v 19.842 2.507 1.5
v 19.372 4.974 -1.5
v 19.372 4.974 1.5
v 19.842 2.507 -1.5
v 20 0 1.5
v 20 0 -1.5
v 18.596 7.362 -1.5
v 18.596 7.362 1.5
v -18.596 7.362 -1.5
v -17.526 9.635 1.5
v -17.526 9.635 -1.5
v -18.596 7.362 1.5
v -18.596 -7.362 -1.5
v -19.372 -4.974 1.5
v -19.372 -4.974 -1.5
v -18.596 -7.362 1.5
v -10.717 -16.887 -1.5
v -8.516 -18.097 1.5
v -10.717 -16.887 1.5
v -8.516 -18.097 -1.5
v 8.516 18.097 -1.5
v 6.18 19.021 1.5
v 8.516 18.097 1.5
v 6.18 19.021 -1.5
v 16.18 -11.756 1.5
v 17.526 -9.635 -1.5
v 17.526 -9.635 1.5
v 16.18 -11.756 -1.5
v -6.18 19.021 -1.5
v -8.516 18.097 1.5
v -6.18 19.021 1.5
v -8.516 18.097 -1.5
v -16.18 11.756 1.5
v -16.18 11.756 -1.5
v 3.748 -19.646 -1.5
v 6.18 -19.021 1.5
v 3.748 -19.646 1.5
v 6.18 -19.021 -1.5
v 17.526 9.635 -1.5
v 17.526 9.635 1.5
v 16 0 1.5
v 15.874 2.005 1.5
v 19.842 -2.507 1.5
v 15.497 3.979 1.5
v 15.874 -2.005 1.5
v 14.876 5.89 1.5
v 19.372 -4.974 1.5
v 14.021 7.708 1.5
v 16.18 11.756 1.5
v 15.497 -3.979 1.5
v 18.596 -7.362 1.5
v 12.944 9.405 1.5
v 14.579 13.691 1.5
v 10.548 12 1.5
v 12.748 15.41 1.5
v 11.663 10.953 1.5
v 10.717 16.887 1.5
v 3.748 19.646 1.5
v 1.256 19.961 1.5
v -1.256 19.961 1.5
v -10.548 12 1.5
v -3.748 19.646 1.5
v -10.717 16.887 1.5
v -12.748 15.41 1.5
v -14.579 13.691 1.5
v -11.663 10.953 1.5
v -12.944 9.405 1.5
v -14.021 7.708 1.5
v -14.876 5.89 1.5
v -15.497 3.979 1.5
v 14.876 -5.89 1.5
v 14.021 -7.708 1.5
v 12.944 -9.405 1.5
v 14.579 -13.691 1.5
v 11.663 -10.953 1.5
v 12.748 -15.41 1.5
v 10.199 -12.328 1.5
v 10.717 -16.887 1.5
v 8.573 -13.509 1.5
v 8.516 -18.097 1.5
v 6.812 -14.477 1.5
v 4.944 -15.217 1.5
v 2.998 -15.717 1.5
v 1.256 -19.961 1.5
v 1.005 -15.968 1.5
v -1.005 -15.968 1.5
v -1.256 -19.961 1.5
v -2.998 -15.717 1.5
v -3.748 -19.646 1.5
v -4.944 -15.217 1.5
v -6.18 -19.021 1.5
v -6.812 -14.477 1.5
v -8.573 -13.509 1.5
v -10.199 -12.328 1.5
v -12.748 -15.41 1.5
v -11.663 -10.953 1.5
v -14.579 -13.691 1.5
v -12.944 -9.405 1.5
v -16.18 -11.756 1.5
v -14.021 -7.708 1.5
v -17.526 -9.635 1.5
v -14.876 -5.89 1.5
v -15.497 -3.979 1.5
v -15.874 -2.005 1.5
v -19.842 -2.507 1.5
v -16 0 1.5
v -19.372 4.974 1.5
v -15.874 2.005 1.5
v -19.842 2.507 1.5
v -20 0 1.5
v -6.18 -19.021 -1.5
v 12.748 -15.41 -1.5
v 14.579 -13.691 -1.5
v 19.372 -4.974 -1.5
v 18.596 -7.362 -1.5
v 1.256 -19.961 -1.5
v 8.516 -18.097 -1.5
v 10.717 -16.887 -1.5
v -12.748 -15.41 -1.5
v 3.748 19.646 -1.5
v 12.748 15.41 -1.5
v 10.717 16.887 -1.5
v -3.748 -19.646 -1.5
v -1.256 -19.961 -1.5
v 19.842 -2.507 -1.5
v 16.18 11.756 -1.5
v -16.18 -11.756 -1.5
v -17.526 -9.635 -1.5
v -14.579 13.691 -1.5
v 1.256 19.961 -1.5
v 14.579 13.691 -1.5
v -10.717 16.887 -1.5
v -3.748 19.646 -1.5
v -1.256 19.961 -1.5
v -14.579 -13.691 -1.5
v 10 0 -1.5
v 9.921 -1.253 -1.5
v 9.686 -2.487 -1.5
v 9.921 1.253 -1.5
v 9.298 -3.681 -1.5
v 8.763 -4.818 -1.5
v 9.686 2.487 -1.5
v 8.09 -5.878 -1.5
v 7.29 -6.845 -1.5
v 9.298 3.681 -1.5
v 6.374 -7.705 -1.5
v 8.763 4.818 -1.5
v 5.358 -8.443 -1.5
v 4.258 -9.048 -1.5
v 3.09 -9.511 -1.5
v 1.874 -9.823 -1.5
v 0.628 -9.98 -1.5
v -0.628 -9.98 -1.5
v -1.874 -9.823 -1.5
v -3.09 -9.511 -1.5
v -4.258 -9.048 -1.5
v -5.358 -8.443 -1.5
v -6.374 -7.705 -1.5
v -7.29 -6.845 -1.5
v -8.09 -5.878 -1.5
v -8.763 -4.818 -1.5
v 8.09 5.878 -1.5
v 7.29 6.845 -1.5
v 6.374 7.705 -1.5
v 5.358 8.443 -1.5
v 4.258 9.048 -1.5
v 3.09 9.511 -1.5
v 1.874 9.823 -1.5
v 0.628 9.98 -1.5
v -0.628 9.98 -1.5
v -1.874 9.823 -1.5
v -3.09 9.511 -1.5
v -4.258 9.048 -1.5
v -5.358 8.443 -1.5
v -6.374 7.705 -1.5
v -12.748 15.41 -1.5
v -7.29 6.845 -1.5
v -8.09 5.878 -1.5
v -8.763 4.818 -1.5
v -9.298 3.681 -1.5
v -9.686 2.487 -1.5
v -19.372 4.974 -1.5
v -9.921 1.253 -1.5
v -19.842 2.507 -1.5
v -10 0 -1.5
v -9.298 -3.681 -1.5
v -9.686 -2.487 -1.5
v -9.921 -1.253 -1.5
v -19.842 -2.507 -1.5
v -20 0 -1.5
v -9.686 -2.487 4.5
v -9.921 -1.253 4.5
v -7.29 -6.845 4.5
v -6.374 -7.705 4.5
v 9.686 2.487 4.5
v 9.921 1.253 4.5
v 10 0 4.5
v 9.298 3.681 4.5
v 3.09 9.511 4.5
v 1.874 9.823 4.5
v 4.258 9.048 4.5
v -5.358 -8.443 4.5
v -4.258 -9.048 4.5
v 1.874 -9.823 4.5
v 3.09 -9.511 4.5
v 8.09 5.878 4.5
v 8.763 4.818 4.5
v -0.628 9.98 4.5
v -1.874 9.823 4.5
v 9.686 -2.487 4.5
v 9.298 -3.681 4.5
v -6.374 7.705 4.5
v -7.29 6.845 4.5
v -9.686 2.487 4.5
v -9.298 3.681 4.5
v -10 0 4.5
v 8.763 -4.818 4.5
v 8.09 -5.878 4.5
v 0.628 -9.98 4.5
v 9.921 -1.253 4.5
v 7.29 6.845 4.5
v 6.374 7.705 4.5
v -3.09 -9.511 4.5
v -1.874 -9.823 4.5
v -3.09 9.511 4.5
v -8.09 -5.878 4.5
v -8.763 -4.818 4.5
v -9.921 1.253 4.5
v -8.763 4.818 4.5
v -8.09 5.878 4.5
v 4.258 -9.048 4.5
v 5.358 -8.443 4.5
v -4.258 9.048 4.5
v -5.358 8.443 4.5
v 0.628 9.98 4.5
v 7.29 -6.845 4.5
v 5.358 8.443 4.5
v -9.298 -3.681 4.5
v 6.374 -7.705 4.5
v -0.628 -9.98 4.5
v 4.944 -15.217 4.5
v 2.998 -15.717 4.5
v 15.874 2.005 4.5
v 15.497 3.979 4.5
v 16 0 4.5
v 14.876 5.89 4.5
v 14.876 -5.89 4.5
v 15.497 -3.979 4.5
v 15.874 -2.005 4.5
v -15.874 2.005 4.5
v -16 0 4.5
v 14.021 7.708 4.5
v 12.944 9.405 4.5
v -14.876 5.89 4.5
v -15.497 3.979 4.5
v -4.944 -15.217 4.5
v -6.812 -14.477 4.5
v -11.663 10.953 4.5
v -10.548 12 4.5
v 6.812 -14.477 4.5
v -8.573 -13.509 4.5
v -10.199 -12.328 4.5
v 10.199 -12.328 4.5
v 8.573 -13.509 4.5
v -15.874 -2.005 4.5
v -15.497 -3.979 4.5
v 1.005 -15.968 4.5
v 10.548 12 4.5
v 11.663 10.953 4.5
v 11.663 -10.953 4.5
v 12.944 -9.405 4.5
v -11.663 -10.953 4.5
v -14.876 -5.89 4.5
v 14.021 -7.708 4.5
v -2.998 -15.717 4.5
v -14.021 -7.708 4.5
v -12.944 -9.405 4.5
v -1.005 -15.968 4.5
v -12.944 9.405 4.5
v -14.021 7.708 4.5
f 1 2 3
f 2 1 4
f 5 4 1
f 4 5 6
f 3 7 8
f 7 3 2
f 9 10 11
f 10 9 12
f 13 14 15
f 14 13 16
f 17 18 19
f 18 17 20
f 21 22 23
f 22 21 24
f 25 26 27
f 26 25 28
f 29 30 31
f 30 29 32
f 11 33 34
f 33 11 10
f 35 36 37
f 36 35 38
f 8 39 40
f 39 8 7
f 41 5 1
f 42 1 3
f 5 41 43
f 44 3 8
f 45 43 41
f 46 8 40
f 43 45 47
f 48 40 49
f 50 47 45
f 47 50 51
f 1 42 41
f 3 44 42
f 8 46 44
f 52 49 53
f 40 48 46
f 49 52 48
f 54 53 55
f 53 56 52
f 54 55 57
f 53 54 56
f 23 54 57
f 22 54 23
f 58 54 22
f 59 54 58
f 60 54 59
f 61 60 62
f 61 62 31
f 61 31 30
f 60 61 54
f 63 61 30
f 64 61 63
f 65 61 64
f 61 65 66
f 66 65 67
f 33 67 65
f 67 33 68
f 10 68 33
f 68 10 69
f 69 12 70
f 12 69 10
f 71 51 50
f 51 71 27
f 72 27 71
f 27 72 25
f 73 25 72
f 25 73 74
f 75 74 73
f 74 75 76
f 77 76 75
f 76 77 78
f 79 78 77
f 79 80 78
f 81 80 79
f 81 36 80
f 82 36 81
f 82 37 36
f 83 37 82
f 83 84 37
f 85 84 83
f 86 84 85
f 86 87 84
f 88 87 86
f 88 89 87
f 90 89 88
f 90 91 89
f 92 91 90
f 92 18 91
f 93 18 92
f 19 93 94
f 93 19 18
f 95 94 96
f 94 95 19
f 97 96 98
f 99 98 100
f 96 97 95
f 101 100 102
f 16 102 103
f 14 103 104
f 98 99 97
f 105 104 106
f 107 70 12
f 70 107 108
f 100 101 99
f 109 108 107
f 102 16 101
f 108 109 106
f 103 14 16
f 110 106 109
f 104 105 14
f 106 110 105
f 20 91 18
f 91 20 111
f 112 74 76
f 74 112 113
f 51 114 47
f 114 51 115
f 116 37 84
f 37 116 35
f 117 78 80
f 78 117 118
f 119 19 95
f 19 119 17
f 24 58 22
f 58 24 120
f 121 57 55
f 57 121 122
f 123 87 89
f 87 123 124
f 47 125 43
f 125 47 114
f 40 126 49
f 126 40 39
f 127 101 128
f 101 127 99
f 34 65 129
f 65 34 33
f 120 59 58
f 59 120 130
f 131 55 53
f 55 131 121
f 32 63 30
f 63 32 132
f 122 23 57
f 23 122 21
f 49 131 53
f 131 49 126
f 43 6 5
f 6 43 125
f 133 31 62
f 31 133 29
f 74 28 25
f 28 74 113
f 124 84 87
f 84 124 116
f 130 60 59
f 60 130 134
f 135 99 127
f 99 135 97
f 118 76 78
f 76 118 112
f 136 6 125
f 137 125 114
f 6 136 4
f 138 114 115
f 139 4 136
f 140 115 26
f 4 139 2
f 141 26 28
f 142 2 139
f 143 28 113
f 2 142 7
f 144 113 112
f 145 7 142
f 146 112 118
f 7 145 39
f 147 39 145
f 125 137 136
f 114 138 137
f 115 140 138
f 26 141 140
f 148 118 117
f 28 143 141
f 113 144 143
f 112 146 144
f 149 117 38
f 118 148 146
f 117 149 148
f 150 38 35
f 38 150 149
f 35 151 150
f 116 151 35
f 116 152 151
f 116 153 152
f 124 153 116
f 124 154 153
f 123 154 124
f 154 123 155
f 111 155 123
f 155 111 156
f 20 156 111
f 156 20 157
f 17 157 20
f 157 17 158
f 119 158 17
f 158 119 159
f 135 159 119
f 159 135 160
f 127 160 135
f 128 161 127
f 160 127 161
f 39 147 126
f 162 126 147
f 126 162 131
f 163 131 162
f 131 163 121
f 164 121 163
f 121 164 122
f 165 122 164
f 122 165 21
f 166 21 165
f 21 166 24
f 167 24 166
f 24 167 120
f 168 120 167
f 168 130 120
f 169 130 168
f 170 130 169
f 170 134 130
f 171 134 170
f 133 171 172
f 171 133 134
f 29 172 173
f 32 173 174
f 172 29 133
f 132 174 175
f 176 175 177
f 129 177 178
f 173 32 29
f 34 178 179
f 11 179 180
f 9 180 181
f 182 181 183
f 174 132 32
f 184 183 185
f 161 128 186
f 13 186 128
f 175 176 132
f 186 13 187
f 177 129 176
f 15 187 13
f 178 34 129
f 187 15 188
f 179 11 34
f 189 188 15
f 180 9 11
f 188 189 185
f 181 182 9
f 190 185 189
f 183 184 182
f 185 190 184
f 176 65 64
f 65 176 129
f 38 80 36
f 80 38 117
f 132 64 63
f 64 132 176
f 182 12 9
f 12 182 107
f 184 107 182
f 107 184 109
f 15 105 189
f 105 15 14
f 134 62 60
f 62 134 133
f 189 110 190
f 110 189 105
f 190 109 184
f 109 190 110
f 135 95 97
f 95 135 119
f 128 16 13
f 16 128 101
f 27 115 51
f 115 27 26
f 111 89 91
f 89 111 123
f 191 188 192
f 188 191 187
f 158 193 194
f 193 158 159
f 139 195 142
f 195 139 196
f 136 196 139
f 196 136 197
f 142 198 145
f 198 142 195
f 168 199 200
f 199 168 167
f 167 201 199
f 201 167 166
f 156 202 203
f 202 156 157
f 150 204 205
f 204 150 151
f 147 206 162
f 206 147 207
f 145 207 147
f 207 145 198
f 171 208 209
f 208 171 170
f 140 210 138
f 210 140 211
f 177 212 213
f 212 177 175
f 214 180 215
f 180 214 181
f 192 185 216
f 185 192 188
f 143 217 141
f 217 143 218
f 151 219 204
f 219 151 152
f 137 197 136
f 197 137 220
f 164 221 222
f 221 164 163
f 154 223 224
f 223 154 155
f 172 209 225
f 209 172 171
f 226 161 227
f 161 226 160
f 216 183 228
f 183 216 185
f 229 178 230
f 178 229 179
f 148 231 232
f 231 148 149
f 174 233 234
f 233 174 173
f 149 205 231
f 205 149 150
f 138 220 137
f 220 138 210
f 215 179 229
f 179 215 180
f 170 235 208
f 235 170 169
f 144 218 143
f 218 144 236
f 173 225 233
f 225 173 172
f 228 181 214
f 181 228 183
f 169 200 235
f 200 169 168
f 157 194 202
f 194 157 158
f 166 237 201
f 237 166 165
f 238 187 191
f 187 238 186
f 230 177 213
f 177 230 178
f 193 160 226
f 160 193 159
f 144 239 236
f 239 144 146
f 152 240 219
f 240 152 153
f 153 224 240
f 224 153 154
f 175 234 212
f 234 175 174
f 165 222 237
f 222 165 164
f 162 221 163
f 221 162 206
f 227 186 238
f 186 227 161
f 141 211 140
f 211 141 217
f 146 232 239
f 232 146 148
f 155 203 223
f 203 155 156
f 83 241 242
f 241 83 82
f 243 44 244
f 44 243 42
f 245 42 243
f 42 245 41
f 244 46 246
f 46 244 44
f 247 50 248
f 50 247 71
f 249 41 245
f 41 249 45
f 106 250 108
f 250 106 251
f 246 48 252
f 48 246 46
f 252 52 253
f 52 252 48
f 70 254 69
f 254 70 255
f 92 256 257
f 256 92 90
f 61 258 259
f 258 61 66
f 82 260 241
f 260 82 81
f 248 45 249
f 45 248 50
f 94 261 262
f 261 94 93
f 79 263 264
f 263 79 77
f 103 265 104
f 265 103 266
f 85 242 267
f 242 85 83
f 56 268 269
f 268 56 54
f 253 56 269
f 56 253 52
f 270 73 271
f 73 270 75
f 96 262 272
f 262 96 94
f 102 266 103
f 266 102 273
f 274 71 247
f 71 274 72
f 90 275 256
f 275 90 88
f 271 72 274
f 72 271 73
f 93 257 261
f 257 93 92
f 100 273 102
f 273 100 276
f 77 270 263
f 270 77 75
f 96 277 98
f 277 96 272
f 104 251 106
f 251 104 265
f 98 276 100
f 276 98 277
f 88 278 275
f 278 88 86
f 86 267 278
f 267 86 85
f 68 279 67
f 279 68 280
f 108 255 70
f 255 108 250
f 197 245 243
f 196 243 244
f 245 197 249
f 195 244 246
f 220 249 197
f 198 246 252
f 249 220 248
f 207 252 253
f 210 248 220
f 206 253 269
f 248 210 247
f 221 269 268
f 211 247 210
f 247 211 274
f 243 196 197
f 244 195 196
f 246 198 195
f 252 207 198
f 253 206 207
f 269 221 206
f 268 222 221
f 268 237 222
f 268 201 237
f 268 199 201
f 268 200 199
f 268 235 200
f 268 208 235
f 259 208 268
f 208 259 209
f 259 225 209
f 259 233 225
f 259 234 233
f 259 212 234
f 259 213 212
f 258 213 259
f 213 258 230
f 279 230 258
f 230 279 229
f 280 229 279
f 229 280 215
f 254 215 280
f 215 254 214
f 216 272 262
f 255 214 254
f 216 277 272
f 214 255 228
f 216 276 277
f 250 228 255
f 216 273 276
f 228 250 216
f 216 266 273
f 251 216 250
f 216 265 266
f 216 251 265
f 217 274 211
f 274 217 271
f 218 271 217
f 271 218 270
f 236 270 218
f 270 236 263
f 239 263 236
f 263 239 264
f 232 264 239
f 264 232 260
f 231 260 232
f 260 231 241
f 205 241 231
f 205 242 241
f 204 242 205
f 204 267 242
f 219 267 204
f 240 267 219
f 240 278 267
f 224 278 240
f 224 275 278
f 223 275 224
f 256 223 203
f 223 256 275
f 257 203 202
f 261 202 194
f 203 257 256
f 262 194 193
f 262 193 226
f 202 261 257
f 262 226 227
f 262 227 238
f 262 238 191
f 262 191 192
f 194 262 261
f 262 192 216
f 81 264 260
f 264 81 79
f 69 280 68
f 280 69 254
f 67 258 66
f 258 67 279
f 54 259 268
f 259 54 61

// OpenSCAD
$fn=50;
WasherDiameter=10;
HoleDiameter=5;
BottomThickness=3;
TopThickness=3;
TopDiameter=8;
DOffset=2;

module Washer($od=WasherDiameter, $id=HoleDiameter, $thickness1=BottomThickness) {
    difference() {
        cylinder(r = $od*2, h = $thickness1, center = true);
        cylinder(r = $id*2, h = $thickness1+1, center = true);
    }
}

module DLock($dod=TopDiameter, $dist=DOffset, $id=HoleDiameter, $od=WasherDiameter, $thickness2=TopThickness) {
    difference() {
        Washer($dod, $id, $thickness2);
        
    
    translate([-$dod*2, $id*2+$dist, -$thickness2/2]) {
        cube([$dod*4,($od-$id)*2,$thickness2+1]);
    }
}
}

module DWasher($od=WasherDiameter, $id=HoleDiameter, $thickness1=BottomThickness, $thickness2=TopThickness, $dist=DOffset) {
    union() {
        Washer();
        translate([0,0,$thickness1]) {
            DLock();
        }
    }
}

DWasher();
